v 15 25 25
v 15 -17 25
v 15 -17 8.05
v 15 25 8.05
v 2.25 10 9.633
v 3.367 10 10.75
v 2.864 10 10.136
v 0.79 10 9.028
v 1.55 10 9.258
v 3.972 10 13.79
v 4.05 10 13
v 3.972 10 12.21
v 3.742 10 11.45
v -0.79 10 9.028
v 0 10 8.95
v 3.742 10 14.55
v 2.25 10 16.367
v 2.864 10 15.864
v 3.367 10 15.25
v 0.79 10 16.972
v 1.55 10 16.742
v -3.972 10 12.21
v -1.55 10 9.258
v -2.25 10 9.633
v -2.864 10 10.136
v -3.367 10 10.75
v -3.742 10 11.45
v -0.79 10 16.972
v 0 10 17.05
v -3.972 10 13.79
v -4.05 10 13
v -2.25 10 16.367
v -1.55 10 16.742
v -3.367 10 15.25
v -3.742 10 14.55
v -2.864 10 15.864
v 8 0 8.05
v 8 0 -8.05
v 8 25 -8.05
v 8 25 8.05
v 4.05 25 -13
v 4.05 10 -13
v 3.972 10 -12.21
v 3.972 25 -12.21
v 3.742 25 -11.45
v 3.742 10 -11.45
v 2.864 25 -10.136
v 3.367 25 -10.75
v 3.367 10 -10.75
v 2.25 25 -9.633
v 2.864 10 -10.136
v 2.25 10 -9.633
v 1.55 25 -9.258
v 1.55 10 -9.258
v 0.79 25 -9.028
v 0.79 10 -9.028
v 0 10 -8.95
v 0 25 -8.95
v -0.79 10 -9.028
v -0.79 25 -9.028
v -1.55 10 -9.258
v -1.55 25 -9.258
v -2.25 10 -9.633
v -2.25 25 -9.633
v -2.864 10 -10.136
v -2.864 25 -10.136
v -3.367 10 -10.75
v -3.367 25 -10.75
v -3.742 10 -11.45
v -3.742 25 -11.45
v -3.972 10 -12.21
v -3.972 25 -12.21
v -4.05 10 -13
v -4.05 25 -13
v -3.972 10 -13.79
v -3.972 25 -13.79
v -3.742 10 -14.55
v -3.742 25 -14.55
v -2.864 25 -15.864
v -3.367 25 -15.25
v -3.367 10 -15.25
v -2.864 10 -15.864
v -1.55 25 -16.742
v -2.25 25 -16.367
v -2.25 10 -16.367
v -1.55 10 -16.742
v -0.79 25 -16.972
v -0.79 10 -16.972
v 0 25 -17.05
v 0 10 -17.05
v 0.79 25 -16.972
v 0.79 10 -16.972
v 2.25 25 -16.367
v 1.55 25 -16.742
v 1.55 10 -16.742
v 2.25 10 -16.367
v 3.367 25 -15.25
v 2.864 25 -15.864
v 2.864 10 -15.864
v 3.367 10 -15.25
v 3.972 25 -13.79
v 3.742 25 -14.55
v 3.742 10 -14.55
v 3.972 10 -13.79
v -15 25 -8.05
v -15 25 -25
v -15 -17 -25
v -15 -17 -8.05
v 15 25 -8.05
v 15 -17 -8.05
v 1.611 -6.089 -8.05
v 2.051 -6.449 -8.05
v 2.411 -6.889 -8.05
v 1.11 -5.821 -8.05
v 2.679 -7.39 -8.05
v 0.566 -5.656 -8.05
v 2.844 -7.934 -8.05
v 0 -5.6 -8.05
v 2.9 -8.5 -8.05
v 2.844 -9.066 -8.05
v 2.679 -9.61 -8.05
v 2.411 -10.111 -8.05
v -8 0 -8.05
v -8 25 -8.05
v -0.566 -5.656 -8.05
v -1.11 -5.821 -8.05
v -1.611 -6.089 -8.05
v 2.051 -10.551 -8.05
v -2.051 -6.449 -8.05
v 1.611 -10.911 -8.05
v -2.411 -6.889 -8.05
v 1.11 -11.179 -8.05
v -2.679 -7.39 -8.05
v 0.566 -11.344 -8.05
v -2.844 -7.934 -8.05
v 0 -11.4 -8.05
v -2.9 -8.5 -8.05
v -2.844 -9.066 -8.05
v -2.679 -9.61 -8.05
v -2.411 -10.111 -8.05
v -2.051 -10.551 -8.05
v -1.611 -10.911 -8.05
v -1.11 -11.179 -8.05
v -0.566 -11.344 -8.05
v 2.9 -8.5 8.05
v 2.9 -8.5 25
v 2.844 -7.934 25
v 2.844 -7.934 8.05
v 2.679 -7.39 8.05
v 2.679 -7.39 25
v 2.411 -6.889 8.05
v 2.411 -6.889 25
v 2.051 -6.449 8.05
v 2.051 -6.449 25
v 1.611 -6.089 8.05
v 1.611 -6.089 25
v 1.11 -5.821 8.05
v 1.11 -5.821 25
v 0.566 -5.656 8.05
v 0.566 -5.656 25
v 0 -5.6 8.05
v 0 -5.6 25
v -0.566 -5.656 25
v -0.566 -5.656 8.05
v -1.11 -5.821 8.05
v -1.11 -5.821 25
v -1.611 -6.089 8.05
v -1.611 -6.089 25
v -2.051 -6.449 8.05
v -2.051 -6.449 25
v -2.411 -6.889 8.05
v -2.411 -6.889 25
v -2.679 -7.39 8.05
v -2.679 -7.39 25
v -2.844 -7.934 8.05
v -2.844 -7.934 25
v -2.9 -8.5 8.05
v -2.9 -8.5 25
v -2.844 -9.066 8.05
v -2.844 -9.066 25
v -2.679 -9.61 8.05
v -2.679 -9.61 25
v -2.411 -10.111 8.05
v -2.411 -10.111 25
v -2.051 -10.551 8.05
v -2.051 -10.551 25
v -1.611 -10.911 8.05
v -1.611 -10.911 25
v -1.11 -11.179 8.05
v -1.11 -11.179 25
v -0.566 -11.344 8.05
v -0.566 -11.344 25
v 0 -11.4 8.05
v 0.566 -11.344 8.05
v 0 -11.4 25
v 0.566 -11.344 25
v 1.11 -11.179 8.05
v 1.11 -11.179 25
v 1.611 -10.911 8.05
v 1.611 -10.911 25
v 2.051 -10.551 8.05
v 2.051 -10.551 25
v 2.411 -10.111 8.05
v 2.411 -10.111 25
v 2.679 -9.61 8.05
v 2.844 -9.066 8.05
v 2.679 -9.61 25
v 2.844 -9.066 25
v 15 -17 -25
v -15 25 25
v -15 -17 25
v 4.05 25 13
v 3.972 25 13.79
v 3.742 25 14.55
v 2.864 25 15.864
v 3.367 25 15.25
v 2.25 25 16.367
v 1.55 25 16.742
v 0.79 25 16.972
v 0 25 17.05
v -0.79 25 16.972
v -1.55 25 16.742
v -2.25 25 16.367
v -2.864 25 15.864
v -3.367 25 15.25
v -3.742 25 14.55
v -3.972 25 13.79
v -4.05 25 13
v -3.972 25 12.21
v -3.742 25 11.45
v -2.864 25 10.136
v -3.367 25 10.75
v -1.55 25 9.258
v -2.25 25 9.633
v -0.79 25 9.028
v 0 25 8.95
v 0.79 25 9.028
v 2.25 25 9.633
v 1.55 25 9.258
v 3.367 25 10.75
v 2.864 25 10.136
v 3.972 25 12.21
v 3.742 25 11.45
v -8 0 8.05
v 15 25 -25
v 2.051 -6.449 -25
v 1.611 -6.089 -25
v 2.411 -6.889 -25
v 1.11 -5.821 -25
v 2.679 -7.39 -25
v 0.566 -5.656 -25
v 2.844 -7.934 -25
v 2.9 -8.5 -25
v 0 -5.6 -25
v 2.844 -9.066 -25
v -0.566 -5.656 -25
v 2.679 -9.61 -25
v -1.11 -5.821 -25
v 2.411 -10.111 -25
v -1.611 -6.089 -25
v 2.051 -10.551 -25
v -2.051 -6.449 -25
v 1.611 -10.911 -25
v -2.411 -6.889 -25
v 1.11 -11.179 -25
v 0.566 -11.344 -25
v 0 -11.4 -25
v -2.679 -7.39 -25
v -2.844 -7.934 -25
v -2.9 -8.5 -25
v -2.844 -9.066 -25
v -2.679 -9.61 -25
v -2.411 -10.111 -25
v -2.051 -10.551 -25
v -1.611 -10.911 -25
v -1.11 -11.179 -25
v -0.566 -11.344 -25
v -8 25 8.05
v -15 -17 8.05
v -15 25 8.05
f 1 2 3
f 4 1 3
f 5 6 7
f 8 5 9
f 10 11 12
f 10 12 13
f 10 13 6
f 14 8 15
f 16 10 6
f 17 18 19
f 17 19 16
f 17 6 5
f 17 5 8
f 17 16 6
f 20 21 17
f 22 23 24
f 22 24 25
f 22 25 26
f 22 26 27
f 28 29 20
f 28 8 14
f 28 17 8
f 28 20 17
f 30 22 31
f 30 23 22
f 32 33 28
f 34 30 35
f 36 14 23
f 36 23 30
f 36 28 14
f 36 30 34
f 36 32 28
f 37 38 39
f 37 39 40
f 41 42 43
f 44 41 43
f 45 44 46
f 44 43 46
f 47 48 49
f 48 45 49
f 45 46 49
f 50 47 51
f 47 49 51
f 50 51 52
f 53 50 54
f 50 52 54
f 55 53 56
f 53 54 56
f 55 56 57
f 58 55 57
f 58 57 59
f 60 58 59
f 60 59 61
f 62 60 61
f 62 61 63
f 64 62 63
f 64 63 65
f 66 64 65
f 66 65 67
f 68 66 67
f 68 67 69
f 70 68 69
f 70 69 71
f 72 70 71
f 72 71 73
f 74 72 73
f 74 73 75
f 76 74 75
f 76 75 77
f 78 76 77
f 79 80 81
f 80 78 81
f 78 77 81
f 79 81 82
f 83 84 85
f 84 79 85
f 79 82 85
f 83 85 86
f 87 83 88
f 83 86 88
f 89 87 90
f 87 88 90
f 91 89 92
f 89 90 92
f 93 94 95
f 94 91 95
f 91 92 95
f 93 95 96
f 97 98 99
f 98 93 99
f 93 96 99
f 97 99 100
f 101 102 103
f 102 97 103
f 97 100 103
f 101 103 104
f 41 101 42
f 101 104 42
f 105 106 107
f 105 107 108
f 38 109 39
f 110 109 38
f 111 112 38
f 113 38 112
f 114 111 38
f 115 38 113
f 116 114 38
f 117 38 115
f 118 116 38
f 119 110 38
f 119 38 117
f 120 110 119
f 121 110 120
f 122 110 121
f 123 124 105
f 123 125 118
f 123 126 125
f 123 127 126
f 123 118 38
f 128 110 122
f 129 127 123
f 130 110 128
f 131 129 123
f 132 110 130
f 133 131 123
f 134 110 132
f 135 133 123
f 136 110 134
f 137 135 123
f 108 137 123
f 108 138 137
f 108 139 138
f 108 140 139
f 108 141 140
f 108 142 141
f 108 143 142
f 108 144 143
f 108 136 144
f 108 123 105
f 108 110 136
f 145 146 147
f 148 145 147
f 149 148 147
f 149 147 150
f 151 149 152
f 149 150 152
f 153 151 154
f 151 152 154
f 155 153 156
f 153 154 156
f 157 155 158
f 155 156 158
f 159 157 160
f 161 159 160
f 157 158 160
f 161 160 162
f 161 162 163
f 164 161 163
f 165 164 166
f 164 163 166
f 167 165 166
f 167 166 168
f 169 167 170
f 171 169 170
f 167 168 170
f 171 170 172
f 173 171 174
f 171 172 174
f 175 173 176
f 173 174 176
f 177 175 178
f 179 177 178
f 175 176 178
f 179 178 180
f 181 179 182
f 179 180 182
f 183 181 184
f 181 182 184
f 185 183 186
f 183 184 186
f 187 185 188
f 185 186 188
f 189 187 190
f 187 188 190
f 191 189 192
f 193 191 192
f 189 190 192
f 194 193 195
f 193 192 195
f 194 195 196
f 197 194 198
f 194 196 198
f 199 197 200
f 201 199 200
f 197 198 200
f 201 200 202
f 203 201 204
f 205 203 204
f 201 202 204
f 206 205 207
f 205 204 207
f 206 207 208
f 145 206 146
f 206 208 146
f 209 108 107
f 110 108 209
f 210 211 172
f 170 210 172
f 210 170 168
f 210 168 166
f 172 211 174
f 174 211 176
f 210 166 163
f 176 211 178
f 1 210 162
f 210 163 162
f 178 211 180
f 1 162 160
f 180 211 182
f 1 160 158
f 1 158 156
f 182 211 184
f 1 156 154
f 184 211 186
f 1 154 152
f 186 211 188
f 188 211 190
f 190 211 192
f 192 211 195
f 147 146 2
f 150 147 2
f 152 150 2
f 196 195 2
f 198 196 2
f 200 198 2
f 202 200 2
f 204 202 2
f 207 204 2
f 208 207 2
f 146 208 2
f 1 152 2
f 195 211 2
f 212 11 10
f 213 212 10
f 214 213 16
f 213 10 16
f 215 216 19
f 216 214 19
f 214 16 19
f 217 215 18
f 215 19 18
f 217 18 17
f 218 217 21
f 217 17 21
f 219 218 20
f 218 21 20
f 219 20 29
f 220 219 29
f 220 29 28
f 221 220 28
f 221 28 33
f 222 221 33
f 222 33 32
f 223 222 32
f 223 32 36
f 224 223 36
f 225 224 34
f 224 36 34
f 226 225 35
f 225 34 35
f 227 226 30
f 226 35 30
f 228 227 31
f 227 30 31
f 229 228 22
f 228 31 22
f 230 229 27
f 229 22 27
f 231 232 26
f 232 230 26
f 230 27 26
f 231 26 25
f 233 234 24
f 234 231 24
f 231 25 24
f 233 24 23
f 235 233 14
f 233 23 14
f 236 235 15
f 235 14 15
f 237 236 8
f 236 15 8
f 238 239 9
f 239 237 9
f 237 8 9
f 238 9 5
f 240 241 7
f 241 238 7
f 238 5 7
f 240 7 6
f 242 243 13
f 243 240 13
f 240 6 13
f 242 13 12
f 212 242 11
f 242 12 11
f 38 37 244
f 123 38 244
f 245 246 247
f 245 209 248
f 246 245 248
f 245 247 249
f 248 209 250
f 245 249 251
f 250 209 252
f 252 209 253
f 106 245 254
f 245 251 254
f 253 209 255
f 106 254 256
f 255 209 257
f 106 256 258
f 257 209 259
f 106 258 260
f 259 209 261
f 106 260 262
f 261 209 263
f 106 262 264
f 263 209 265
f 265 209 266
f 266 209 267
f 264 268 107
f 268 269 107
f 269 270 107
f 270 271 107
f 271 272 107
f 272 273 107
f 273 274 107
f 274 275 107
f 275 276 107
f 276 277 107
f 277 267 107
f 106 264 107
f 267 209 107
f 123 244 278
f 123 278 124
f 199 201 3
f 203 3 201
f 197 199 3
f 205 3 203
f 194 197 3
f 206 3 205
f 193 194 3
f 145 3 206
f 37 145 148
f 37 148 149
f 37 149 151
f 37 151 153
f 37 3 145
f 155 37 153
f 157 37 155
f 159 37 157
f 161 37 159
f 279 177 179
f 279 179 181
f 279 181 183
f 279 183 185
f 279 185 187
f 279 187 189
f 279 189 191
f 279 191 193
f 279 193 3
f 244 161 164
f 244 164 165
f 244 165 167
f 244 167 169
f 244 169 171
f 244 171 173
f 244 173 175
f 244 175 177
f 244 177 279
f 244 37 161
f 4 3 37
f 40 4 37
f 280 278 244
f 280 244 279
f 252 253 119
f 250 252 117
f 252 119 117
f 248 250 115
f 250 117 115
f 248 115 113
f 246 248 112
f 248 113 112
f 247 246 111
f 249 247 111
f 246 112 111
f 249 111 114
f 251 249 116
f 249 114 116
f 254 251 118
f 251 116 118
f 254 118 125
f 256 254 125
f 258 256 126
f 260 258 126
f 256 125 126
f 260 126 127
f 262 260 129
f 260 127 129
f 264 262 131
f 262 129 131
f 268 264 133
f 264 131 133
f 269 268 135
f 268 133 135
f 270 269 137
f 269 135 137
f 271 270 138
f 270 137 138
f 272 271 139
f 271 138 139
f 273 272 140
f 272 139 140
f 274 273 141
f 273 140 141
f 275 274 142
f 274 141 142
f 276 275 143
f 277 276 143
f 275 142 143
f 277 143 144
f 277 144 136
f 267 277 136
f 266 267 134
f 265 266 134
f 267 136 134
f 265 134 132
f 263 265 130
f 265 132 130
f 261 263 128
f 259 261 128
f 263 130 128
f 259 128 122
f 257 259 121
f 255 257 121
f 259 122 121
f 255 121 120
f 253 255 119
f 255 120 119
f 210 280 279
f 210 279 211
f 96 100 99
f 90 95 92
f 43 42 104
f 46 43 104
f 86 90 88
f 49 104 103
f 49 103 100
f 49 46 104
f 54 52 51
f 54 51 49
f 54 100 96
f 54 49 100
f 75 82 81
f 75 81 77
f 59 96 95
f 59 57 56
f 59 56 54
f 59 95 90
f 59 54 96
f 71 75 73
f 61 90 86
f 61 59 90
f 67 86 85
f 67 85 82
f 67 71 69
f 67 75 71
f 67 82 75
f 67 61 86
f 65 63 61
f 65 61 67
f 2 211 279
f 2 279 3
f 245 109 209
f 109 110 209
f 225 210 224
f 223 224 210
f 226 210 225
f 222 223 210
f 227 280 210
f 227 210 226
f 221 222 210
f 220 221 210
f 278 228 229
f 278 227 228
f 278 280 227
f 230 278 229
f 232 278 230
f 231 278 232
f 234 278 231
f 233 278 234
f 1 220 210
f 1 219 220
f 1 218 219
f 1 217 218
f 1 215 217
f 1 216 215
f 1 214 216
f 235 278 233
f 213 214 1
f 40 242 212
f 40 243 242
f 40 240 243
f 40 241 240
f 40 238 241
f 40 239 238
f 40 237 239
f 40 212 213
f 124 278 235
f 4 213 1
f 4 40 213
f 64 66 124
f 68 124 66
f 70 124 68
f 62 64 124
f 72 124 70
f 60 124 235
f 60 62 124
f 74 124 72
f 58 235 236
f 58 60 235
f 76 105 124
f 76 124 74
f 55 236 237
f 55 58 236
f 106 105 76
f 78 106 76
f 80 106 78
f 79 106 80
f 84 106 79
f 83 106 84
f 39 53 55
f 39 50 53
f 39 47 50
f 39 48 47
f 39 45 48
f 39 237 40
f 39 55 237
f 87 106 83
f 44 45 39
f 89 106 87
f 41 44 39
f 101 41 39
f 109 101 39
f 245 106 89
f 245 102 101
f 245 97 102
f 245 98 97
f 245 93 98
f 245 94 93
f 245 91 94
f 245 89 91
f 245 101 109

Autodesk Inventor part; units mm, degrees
ref_plane "YZ Plane" through (0, 0, 0) normal (1, 0, 0) x (0, 1, 0)
ref_plane "XZ Plane" through (0, 0, 0) normal (0, 1, 0) x (-1, 0, 0)
ref_plane "XY Plane" through (0, 0, 0) normal (0, 0, 1) x (1, 0, 0)
sketch "Esquisse1" plane through (0, 0, 0) normal (0, 1, 0) x (-1, 0, 0)
  line L0 (15, 25) -> (-15, 25)
  line L1 (-15, 25) -> (-15, -25)
  line L2 (-15, -25) -> (15, -25)
  line L3 (15, -25) -> (15, 25)
  line L4 (15, 25) -> (-15, -25)
  line L5 (-15, 25) -> (15, -25)
  circle A0 centre (0, 14) radius 4.05
  line L6 (21, 0) -> (-18, 0)
  circle A1 centre (0, -14) radius 4.05
  point P0 (0, 0)
  point P1 (0, 0)
  point P2 (0, 0)
  dimension "d0" = 50
  dimension "d1" = 30
  dimension "d2" = 8.1
  dimension "d3" = 14
extrude "Extrusion1" add sketch "Esquisse1" along normal blind 10 contours L4 L5 L0 | L3 L6 L4 | L5 L6 L1 | L3 L5 L6 | L5 L2 L4 | L4 L1 L6 | A0 | A1
sketch "Esquisse2" plane through (0, 10, 0) normal (0, 1, 0) x (1, 0, 0)
  circle A0 centre (0, -13) radius 4.05
  line L0 (-17, 0) -> (22, 0)
  circle A1 centre (0, 13) radius 4.05
  line L1 (-15, 25) -> (-15, -25) projected
  line L2 (15, -25) -> (15, 25) projected
  line L3 (-15, -25) -> (15, -25)
  line L4 (15, -25) -> (15, 25)
  line L5 (15, 25) -> (-15, 25)
  line L6 (-15, 25) -> (-15, -25)
  point P0 (0, 0)
  dimension "d6" = 8.1
  dimension "d7" = 13
extrude "Extrusion2" add sketch "Esquisse2" along normal blind 15
sketch "Esquisse3" plane through (0, 0, 0) normal (0, -1, 0) x (1, 0, 0)
  line L0 (-15, -25) -> (-15, 25) projected
  line L1 (15, 25) -> (15, -25) projected
  line L2 (-15, -8.05) -> (15, -8.05)
  line L3 (15, -8.05) -> (15, 8.05)
  line L4 (15, 8.05) -> (-15, 8.05)
  line L5 (-15, 8.05) -> (-15, -8.05)
  line L6 (-15, -8.05) -> (15, 8.05)
  line L7 (15, -8.05) -> (-15, 8.05)
  line L8 (15, -25) -> (-15, -25) projected
  line L9 (-15, 25) -> (15, 25) projected
  line L10 (-15, -25) -> (15, -25)
  line L11 (15, -25) -> (15, 25)
  line L12 (15, 25) -> (-15, 25)
  line L13 (-15, 25) -> (-15, -25)
  point P0 (0, 0)
  point P1 (0, 0)
  point P2 (0, 0)
  point P3 (-15, 8.05)
  point P4 (15, -8.05)
  dimension "d10" = 16.1
extrude "Extrusion3" add sketch "Esquisse3" along normal blind 17 contours L0 L2 L1 L8 | L0 L9 L1 L4
sketch "Esquisse4" plane through (-15, 25, 25) normal (0, 0, 1) x (1, 0, 0)
  line L0 (30, -25) -> (30, -42) projected
  line L1 (30, -25) -> (0, -25) projected
  line L2 (30, -42) -> (0, -42)
  line L3 (0, -42) -> (0, -25)
  line L4 (0, -25) -> (30, -25)
  line L5 (30, -25) -> (30, -42)
  circle A0 centre (15, -33.5) radius 2.9
  point P0 (15, -25)
  dimension "d13" = 5.8
extrude "Extrusion4" cut sketch "Esquisse4" against normal blind 50 contours A0
sketch "Esquisse5" plane through (0, 0, 0) normal (0, -1, 0) x (1, 0, 0)
  line L0 (15, -8.05) -> (-15, -8.05) projected
  line L1 (-15, 8.05) -> (15, 8.05) projected
  line L2 (-8, -8.05) -> (8, -8.05)
  line L3 (8, -8.05) -> (8, 8.05)
  line L4 (8, 8.05) -> (-8, 8.05)
  line L5 (-8, 8.05) -> (-8, -8.05)
  line L6 (-8, -8.05) -> (8, 8.05)
  line L7 (8, -8.05) -> (-8, 8.05)
  line L8 (-15, -8.05) -> (15, -8.05)
  line L9 (15, -8.05) -> (15, 8.05)
  line L10 (15, 8.05) -> (-15, 8.05)
  line L11 (-15, 8.05) -> (-15, -8.05)
  point P0 (0, 0)
  point P1 (0, 0)
  point P2 (0, 0)
  point P3 (8, -8.05)
  point P4 (-8, 8.05)
  dimension "d16" = 16
extrude "Extrusion5" cut sketch "Esquisse5" against normal blind 25 contours L0 L3 L1 L9 | L0 L11 L1 L5
